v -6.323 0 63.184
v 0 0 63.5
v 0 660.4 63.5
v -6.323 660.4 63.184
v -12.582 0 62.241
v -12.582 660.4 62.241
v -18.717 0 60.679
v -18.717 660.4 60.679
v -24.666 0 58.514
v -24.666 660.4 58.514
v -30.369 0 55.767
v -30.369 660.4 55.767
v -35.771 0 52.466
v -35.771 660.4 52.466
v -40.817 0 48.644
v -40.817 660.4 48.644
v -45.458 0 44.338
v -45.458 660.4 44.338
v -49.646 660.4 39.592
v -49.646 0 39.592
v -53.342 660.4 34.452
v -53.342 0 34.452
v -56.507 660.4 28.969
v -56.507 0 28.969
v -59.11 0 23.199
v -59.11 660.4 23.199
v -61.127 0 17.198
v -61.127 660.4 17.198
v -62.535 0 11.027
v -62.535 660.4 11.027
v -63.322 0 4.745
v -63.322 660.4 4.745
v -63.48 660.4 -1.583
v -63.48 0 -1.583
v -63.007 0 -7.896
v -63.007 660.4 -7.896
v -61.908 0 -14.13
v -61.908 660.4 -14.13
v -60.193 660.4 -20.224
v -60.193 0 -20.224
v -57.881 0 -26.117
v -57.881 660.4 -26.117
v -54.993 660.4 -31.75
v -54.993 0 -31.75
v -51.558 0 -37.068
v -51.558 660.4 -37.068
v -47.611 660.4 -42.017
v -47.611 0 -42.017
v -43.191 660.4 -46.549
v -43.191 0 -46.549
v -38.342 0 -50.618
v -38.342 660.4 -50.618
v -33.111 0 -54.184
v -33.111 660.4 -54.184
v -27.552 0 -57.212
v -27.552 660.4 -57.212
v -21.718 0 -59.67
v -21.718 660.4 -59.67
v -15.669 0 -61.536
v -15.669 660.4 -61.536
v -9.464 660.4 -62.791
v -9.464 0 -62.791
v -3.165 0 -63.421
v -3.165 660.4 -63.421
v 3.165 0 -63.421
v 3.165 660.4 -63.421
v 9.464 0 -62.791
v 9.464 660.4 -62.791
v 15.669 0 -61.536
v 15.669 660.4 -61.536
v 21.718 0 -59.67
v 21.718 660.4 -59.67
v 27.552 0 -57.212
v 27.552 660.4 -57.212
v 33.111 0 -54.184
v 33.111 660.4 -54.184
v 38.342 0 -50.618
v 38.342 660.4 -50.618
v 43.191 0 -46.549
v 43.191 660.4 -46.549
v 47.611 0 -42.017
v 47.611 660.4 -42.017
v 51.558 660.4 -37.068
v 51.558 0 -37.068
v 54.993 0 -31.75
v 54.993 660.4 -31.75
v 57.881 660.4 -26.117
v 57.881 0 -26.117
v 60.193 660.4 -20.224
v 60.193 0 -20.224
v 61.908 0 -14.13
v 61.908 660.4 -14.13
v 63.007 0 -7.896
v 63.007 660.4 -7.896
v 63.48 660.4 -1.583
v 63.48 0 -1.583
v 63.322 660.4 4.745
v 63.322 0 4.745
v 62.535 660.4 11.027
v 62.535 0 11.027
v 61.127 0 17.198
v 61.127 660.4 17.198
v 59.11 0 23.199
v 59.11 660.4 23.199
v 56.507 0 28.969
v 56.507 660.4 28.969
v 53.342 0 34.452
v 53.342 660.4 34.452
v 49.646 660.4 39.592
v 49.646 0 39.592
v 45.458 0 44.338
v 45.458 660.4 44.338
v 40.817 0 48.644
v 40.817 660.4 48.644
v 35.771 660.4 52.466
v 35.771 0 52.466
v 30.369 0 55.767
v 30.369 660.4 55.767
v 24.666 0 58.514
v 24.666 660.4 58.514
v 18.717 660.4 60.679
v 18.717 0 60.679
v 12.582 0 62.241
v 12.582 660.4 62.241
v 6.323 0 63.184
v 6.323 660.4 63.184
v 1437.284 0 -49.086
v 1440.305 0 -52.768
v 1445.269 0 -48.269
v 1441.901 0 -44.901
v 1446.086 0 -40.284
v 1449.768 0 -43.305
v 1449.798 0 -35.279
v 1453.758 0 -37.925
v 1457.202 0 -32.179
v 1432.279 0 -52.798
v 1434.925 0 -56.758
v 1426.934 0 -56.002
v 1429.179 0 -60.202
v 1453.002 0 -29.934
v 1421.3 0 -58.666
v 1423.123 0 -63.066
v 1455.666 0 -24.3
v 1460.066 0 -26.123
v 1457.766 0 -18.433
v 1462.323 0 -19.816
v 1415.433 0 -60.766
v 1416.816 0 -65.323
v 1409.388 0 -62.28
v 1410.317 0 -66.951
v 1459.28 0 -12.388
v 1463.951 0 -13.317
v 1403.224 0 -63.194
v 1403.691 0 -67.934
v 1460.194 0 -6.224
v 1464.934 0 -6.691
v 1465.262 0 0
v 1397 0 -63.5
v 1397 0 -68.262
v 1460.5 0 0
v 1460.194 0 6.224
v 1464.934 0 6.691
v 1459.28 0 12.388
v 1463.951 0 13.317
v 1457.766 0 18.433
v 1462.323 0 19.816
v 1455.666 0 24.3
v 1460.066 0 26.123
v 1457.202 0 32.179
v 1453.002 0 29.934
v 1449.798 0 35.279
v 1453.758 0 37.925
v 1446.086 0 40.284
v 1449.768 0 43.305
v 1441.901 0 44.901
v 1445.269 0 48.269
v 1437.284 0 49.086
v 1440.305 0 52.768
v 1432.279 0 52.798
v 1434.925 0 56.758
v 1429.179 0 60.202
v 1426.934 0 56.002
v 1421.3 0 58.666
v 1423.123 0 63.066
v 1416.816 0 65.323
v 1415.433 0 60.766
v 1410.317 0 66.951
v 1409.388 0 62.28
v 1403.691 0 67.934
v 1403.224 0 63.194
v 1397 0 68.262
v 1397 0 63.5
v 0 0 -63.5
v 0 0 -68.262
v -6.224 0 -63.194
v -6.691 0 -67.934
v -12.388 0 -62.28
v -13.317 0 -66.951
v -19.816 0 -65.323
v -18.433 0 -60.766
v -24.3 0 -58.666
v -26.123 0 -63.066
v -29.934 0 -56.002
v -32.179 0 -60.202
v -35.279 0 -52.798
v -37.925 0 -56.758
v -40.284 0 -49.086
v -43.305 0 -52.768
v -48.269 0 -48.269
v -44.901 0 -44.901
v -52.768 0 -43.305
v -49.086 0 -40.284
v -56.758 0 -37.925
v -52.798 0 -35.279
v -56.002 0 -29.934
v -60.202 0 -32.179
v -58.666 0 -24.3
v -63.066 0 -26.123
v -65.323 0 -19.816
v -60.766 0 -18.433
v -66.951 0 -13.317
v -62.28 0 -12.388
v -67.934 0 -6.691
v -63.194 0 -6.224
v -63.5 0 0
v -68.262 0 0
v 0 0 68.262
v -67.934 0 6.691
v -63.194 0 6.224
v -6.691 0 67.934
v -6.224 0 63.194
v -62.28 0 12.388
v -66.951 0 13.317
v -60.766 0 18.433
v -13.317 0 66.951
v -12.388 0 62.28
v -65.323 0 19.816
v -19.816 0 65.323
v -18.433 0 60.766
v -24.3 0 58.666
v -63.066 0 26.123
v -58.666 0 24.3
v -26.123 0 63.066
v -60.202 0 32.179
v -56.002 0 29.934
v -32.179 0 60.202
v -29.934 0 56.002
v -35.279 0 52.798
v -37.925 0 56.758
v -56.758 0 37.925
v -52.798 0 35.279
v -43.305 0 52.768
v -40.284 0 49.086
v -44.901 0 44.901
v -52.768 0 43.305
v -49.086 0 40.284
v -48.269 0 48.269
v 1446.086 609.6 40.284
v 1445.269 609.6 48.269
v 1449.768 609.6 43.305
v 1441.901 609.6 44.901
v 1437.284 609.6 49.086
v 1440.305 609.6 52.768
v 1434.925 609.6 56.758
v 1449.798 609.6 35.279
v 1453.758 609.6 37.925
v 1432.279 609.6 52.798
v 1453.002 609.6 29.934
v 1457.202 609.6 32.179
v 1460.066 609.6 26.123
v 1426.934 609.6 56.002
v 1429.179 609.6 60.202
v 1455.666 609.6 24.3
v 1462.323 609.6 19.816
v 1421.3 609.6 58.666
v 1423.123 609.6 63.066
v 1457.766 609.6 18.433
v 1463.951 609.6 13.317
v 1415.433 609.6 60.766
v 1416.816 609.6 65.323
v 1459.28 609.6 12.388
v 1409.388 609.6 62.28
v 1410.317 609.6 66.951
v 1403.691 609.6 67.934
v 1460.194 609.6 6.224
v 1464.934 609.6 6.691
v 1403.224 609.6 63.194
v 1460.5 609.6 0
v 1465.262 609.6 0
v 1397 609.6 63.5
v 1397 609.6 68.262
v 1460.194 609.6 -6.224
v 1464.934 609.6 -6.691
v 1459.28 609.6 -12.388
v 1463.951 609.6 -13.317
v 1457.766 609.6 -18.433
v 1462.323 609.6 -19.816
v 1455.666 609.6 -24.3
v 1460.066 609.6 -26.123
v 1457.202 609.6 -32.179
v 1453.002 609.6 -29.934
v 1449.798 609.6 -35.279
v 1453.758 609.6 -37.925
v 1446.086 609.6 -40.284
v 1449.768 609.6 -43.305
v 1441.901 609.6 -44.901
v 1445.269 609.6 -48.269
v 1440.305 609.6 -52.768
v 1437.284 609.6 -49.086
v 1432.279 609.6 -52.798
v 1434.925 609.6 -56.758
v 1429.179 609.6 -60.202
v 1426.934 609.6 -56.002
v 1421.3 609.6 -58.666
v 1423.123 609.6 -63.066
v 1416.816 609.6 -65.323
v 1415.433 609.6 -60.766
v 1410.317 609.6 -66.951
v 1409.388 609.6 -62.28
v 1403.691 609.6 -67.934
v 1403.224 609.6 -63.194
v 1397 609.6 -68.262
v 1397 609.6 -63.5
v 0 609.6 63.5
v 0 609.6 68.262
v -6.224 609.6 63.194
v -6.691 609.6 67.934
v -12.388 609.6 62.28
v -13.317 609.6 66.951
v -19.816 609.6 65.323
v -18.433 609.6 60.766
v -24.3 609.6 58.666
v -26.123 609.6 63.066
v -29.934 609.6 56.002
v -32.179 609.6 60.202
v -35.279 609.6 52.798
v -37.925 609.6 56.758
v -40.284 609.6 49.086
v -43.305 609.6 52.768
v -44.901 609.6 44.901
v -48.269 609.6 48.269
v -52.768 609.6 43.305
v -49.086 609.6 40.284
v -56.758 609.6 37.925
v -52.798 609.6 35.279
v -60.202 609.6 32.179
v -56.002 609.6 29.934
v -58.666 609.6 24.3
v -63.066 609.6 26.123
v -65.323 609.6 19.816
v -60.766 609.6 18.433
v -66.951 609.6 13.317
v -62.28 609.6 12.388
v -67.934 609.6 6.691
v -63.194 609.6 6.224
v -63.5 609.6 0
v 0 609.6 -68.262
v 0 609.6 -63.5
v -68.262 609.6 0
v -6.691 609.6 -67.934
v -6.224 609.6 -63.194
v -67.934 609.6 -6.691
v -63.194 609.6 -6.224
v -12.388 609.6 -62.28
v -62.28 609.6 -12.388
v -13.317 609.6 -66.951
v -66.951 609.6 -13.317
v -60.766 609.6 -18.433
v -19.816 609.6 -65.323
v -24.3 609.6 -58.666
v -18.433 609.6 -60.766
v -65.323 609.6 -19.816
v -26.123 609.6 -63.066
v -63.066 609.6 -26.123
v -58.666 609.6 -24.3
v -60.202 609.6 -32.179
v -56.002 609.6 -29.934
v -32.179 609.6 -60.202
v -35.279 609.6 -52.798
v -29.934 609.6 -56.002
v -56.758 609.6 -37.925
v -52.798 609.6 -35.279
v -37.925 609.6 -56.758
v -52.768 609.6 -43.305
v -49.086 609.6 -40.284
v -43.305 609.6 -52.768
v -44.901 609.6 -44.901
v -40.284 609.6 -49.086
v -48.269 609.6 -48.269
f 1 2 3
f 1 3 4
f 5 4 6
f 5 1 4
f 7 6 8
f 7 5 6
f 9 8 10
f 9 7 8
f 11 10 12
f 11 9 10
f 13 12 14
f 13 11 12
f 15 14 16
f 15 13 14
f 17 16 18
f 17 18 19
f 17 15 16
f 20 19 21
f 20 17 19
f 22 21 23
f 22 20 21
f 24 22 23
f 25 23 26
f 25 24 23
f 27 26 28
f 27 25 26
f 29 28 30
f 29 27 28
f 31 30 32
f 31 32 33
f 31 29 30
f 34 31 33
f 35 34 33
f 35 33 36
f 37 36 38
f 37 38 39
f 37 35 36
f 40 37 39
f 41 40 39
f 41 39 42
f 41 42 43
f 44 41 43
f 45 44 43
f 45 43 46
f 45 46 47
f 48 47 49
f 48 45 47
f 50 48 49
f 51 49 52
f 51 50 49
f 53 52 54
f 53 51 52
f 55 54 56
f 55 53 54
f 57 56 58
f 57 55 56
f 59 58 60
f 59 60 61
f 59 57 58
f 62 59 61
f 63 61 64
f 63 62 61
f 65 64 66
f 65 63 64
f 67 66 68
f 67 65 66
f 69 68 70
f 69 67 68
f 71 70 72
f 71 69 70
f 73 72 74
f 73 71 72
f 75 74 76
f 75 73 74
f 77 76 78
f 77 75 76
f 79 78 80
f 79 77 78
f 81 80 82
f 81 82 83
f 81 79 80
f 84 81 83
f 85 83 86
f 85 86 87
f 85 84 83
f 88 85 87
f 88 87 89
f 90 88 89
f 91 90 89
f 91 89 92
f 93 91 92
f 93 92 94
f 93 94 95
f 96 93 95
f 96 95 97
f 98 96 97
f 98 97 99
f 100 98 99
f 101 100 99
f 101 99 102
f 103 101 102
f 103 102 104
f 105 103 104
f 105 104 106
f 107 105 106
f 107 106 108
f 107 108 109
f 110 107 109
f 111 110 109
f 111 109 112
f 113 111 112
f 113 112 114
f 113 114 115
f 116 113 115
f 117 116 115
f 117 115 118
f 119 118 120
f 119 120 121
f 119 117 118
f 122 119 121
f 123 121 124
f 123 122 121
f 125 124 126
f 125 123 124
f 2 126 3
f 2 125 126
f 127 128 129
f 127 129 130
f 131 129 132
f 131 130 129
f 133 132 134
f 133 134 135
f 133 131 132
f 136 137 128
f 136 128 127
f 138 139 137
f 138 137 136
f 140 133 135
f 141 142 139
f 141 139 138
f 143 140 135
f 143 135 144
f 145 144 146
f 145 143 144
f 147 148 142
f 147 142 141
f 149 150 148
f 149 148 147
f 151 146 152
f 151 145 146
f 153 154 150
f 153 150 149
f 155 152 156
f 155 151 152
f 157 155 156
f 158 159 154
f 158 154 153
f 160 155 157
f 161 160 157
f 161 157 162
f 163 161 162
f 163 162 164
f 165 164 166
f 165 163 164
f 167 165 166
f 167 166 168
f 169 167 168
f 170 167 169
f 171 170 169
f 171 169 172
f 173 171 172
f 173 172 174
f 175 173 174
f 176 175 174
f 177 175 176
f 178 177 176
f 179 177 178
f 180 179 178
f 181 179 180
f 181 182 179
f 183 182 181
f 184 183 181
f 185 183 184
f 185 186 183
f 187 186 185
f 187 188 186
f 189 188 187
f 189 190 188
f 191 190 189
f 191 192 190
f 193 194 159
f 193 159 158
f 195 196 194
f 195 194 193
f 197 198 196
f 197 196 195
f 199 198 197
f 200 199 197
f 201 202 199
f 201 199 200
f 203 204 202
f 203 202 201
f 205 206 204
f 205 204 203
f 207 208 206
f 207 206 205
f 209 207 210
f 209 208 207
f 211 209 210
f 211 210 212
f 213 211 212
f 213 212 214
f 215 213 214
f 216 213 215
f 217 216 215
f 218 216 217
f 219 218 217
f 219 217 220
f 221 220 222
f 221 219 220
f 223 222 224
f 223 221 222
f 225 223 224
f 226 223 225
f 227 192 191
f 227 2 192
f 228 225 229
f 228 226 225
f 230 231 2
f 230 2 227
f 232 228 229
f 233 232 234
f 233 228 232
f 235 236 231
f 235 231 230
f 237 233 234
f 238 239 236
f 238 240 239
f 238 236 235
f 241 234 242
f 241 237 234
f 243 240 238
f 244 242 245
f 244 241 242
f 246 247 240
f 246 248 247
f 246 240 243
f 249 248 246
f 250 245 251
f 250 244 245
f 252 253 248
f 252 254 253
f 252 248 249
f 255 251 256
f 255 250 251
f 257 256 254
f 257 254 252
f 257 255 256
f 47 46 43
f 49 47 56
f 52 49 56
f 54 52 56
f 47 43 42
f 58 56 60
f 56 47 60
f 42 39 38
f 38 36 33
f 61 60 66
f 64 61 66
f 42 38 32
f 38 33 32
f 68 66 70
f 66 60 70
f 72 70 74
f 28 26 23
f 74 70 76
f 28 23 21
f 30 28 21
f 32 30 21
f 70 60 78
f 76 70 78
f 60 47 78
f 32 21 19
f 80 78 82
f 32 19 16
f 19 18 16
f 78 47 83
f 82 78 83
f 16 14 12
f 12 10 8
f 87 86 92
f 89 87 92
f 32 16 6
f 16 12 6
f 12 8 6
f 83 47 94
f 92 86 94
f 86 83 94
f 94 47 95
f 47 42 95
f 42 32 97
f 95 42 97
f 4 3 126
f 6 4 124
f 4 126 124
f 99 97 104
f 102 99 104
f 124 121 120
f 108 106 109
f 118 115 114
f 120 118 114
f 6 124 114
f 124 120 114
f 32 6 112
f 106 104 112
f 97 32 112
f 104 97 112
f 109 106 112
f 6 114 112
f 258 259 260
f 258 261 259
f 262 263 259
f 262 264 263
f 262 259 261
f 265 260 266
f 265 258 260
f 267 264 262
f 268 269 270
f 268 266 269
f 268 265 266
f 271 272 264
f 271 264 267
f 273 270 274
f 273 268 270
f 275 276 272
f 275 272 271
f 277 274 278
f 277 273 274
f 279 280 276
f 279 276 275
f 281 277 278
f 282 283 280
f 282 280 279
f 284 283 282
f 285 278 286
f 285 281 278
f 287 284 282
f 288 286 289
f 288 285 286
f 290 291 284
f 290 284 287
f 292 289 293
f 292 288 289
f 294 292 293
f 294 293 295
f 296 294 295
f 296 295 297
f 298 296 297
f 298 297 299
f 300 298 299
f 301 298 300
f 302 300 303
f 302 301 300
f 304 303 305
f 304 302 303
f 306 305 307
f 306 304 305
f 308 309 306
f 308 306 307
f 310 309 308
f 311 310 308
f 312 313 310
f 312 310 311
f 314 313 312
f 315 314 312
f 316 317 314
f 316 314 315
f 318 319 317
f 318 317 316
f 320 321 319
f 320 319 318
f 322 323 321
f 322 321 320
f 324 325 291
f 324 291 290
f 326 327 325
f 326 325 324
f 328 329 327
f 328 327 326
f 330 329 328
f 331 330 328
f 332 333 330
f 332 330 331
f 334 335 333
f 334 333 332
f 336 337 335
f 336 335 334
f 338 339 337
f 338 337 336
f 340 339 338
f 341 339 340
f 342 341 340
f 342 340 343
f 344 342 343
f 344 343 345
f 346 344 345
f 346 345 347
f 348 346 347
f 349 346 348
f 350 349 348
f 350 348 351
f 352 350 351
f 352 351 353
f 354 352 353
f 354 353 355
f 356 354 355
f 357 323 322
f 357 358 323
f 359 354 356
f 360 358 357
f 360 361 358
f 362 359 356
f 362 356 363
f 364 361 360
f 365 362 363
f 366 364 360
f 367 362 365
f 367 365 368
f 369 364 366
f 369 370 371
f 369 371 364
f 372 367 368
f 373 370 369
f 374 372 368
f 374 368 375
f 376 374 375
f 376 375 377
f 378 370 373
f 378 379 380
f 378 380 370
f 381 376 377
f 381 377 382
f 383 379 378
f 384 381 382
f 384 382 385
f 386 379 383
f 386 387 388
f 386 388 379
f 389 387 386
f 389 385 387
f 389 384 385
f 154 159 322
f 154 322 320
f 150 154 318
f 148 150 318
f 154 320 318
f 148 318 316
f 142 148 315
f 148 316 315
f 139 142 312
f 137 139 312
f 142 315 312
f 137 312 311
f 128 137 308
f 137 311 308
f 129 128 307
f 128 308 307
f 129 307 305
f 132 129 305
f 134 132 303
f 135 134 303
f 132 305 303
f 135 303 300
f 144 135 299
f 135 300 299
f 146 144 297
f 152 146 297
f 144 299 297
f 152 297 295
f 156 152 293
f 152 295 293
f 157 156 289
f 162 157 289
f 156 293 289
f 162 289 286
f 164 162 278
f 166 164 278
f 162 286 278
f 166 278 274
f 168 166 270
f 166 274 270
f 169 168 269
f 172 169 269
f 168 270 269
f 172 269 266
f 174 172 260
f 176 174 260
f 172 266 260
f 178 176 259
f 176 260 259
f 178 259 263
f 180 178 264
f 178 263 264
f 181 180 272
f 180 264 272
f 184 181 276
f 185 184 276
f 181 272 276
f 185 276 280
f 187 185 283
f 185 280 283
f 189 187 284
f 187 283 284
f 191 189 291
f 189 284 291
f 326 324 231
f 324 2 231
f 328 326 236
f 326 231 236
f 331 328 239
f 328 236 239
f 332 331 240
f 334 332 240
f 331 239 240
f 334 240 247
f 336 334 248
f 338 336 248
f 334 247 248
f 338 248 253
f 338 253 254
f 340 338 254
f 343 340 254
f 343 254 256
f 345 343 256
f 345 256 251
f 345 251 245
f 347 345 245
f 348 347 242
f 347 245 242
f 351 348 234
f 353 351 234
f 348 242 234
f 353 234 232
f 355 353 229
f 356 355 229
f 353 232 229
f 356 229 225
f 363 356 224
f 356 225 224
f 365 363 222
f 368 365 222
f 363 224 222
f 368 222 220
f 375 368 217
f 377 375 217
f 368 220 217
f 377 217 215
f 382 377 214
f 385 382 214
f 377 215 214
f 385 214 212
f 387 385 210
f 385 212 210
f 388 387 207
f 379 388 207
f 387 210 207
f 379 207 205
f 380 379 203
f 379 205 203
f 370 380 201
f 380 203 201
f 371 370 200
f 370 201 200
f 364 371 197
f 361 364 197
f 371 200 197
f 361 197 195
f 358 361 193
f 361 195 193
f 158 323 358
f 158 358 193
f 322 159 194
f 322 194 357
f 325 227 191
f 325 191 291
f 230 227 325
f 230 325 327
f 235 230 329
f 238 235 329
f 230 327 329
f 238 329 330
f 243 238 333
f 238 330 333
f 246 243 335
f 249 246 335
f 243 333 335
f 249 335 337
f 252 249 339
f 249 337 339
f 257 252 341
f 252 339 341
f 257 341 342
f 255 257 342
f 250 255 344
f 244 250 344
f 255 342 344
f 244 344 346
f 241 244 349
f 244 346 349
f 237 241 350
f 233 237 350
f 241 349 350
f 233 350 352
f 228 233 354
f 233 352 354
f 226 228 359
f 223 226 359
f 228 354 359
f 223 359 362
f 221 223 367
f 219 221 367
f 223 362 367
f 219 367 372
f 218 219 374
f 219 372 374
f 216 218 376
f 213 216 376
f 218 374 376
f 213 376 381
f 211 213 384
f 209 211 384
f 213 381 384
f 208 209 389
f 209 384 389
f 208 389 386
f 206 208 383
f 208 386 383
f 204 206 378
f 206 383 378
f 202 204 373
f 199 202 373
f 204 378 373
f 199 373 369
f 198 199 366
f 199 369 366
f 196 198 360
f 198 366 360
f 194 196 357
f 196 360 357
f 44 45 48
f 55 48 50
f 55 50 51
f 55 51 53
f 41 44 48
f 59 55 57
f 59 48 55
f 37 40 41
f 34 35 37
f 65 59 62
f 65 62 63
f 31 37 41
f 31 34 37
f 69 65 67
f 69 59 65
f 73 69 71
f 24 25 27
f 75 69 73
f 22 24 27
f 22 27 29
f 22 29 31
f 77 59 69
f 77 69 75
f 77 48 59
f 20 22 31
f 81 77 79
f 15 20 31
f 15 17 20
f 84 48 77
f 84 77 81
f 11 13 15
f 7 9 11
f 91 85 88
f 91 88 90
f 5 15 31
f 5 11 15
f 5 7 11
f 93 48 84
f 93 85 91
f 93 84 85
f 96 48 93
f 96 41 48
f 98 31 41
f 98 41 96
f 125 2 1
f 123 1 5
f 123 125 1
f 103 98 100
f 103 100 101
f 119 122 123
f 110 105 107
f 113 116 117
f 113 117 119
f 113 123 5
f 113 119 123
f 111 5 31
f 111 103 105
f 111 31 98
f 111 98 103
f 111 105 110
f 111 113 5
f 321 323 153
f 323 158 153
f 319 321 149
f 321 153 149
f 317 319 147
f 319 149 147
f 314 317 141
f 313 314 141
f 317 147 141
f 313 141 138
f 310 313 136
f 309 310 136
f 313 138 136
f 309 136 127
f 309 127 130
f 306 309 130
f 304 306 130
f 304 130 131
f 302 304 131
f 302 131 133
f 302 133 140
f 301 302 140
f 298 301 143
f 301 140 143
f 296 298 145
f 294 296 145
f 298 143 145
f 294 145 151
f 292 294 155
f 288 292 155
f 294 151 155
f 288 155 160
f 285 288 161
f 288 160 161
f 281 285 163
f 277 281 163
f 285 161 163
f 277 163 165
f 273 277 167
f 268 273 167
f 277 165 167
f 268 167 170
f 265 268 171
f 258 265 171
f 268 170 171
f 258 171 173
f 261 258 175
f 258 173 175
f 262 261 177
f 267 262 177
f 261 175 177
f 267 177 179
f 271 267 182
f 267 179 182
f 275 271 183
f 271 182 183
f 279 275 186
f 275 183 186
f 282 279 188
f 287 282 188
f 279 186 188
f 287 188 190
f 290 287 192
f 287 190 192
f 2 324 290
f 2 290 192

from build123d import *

# Parameters (mm, degrees)
F2_W     = 609.6
F2_H     = 4.7625
F4_DEPTH = 660.4


with BuildPart() as f3:
    # F3: sweep along a path in F0
    with BuildLine(Plane.XZ) as f3_path:
        Line((1397, 63.5), (0, 63.5))
        ThreePointArc((0, 63.5), (-63.5, 0), (0, -63.5))
        Line((0, -63.5), (1397, -63.5))
        ThreePointArc((1397, -63.5), (1460.5, 0), (1397, 63.5))
    # F2 (on face) → F3 (sweep)
    with BuildSketch(Plane(origin=(1397, 0, 0), x_dir=(0, -1, 0), z_dir=(-1, 0, 0))):
        with Locations((-304.8, 65.88125)):
            Rectangle(F2_W, F2_H)
    sweep(path=f3_path.line)


with BuildPart() as f4:
    # F0 (on Front) → F4 (new body)
    with BuildSketch(Plane.XZ):
        with BuildLine():
            ThreePointArc((0, -63.5), (63.5, 0), (0, 63.5))
            ThreePointArc((0, 63.5), (-63.5, 0), (0, -63.5))
        make_face()
    extrude(amount=-F4_DEPTH)


solid = Compound([f3.part, f4.part])
